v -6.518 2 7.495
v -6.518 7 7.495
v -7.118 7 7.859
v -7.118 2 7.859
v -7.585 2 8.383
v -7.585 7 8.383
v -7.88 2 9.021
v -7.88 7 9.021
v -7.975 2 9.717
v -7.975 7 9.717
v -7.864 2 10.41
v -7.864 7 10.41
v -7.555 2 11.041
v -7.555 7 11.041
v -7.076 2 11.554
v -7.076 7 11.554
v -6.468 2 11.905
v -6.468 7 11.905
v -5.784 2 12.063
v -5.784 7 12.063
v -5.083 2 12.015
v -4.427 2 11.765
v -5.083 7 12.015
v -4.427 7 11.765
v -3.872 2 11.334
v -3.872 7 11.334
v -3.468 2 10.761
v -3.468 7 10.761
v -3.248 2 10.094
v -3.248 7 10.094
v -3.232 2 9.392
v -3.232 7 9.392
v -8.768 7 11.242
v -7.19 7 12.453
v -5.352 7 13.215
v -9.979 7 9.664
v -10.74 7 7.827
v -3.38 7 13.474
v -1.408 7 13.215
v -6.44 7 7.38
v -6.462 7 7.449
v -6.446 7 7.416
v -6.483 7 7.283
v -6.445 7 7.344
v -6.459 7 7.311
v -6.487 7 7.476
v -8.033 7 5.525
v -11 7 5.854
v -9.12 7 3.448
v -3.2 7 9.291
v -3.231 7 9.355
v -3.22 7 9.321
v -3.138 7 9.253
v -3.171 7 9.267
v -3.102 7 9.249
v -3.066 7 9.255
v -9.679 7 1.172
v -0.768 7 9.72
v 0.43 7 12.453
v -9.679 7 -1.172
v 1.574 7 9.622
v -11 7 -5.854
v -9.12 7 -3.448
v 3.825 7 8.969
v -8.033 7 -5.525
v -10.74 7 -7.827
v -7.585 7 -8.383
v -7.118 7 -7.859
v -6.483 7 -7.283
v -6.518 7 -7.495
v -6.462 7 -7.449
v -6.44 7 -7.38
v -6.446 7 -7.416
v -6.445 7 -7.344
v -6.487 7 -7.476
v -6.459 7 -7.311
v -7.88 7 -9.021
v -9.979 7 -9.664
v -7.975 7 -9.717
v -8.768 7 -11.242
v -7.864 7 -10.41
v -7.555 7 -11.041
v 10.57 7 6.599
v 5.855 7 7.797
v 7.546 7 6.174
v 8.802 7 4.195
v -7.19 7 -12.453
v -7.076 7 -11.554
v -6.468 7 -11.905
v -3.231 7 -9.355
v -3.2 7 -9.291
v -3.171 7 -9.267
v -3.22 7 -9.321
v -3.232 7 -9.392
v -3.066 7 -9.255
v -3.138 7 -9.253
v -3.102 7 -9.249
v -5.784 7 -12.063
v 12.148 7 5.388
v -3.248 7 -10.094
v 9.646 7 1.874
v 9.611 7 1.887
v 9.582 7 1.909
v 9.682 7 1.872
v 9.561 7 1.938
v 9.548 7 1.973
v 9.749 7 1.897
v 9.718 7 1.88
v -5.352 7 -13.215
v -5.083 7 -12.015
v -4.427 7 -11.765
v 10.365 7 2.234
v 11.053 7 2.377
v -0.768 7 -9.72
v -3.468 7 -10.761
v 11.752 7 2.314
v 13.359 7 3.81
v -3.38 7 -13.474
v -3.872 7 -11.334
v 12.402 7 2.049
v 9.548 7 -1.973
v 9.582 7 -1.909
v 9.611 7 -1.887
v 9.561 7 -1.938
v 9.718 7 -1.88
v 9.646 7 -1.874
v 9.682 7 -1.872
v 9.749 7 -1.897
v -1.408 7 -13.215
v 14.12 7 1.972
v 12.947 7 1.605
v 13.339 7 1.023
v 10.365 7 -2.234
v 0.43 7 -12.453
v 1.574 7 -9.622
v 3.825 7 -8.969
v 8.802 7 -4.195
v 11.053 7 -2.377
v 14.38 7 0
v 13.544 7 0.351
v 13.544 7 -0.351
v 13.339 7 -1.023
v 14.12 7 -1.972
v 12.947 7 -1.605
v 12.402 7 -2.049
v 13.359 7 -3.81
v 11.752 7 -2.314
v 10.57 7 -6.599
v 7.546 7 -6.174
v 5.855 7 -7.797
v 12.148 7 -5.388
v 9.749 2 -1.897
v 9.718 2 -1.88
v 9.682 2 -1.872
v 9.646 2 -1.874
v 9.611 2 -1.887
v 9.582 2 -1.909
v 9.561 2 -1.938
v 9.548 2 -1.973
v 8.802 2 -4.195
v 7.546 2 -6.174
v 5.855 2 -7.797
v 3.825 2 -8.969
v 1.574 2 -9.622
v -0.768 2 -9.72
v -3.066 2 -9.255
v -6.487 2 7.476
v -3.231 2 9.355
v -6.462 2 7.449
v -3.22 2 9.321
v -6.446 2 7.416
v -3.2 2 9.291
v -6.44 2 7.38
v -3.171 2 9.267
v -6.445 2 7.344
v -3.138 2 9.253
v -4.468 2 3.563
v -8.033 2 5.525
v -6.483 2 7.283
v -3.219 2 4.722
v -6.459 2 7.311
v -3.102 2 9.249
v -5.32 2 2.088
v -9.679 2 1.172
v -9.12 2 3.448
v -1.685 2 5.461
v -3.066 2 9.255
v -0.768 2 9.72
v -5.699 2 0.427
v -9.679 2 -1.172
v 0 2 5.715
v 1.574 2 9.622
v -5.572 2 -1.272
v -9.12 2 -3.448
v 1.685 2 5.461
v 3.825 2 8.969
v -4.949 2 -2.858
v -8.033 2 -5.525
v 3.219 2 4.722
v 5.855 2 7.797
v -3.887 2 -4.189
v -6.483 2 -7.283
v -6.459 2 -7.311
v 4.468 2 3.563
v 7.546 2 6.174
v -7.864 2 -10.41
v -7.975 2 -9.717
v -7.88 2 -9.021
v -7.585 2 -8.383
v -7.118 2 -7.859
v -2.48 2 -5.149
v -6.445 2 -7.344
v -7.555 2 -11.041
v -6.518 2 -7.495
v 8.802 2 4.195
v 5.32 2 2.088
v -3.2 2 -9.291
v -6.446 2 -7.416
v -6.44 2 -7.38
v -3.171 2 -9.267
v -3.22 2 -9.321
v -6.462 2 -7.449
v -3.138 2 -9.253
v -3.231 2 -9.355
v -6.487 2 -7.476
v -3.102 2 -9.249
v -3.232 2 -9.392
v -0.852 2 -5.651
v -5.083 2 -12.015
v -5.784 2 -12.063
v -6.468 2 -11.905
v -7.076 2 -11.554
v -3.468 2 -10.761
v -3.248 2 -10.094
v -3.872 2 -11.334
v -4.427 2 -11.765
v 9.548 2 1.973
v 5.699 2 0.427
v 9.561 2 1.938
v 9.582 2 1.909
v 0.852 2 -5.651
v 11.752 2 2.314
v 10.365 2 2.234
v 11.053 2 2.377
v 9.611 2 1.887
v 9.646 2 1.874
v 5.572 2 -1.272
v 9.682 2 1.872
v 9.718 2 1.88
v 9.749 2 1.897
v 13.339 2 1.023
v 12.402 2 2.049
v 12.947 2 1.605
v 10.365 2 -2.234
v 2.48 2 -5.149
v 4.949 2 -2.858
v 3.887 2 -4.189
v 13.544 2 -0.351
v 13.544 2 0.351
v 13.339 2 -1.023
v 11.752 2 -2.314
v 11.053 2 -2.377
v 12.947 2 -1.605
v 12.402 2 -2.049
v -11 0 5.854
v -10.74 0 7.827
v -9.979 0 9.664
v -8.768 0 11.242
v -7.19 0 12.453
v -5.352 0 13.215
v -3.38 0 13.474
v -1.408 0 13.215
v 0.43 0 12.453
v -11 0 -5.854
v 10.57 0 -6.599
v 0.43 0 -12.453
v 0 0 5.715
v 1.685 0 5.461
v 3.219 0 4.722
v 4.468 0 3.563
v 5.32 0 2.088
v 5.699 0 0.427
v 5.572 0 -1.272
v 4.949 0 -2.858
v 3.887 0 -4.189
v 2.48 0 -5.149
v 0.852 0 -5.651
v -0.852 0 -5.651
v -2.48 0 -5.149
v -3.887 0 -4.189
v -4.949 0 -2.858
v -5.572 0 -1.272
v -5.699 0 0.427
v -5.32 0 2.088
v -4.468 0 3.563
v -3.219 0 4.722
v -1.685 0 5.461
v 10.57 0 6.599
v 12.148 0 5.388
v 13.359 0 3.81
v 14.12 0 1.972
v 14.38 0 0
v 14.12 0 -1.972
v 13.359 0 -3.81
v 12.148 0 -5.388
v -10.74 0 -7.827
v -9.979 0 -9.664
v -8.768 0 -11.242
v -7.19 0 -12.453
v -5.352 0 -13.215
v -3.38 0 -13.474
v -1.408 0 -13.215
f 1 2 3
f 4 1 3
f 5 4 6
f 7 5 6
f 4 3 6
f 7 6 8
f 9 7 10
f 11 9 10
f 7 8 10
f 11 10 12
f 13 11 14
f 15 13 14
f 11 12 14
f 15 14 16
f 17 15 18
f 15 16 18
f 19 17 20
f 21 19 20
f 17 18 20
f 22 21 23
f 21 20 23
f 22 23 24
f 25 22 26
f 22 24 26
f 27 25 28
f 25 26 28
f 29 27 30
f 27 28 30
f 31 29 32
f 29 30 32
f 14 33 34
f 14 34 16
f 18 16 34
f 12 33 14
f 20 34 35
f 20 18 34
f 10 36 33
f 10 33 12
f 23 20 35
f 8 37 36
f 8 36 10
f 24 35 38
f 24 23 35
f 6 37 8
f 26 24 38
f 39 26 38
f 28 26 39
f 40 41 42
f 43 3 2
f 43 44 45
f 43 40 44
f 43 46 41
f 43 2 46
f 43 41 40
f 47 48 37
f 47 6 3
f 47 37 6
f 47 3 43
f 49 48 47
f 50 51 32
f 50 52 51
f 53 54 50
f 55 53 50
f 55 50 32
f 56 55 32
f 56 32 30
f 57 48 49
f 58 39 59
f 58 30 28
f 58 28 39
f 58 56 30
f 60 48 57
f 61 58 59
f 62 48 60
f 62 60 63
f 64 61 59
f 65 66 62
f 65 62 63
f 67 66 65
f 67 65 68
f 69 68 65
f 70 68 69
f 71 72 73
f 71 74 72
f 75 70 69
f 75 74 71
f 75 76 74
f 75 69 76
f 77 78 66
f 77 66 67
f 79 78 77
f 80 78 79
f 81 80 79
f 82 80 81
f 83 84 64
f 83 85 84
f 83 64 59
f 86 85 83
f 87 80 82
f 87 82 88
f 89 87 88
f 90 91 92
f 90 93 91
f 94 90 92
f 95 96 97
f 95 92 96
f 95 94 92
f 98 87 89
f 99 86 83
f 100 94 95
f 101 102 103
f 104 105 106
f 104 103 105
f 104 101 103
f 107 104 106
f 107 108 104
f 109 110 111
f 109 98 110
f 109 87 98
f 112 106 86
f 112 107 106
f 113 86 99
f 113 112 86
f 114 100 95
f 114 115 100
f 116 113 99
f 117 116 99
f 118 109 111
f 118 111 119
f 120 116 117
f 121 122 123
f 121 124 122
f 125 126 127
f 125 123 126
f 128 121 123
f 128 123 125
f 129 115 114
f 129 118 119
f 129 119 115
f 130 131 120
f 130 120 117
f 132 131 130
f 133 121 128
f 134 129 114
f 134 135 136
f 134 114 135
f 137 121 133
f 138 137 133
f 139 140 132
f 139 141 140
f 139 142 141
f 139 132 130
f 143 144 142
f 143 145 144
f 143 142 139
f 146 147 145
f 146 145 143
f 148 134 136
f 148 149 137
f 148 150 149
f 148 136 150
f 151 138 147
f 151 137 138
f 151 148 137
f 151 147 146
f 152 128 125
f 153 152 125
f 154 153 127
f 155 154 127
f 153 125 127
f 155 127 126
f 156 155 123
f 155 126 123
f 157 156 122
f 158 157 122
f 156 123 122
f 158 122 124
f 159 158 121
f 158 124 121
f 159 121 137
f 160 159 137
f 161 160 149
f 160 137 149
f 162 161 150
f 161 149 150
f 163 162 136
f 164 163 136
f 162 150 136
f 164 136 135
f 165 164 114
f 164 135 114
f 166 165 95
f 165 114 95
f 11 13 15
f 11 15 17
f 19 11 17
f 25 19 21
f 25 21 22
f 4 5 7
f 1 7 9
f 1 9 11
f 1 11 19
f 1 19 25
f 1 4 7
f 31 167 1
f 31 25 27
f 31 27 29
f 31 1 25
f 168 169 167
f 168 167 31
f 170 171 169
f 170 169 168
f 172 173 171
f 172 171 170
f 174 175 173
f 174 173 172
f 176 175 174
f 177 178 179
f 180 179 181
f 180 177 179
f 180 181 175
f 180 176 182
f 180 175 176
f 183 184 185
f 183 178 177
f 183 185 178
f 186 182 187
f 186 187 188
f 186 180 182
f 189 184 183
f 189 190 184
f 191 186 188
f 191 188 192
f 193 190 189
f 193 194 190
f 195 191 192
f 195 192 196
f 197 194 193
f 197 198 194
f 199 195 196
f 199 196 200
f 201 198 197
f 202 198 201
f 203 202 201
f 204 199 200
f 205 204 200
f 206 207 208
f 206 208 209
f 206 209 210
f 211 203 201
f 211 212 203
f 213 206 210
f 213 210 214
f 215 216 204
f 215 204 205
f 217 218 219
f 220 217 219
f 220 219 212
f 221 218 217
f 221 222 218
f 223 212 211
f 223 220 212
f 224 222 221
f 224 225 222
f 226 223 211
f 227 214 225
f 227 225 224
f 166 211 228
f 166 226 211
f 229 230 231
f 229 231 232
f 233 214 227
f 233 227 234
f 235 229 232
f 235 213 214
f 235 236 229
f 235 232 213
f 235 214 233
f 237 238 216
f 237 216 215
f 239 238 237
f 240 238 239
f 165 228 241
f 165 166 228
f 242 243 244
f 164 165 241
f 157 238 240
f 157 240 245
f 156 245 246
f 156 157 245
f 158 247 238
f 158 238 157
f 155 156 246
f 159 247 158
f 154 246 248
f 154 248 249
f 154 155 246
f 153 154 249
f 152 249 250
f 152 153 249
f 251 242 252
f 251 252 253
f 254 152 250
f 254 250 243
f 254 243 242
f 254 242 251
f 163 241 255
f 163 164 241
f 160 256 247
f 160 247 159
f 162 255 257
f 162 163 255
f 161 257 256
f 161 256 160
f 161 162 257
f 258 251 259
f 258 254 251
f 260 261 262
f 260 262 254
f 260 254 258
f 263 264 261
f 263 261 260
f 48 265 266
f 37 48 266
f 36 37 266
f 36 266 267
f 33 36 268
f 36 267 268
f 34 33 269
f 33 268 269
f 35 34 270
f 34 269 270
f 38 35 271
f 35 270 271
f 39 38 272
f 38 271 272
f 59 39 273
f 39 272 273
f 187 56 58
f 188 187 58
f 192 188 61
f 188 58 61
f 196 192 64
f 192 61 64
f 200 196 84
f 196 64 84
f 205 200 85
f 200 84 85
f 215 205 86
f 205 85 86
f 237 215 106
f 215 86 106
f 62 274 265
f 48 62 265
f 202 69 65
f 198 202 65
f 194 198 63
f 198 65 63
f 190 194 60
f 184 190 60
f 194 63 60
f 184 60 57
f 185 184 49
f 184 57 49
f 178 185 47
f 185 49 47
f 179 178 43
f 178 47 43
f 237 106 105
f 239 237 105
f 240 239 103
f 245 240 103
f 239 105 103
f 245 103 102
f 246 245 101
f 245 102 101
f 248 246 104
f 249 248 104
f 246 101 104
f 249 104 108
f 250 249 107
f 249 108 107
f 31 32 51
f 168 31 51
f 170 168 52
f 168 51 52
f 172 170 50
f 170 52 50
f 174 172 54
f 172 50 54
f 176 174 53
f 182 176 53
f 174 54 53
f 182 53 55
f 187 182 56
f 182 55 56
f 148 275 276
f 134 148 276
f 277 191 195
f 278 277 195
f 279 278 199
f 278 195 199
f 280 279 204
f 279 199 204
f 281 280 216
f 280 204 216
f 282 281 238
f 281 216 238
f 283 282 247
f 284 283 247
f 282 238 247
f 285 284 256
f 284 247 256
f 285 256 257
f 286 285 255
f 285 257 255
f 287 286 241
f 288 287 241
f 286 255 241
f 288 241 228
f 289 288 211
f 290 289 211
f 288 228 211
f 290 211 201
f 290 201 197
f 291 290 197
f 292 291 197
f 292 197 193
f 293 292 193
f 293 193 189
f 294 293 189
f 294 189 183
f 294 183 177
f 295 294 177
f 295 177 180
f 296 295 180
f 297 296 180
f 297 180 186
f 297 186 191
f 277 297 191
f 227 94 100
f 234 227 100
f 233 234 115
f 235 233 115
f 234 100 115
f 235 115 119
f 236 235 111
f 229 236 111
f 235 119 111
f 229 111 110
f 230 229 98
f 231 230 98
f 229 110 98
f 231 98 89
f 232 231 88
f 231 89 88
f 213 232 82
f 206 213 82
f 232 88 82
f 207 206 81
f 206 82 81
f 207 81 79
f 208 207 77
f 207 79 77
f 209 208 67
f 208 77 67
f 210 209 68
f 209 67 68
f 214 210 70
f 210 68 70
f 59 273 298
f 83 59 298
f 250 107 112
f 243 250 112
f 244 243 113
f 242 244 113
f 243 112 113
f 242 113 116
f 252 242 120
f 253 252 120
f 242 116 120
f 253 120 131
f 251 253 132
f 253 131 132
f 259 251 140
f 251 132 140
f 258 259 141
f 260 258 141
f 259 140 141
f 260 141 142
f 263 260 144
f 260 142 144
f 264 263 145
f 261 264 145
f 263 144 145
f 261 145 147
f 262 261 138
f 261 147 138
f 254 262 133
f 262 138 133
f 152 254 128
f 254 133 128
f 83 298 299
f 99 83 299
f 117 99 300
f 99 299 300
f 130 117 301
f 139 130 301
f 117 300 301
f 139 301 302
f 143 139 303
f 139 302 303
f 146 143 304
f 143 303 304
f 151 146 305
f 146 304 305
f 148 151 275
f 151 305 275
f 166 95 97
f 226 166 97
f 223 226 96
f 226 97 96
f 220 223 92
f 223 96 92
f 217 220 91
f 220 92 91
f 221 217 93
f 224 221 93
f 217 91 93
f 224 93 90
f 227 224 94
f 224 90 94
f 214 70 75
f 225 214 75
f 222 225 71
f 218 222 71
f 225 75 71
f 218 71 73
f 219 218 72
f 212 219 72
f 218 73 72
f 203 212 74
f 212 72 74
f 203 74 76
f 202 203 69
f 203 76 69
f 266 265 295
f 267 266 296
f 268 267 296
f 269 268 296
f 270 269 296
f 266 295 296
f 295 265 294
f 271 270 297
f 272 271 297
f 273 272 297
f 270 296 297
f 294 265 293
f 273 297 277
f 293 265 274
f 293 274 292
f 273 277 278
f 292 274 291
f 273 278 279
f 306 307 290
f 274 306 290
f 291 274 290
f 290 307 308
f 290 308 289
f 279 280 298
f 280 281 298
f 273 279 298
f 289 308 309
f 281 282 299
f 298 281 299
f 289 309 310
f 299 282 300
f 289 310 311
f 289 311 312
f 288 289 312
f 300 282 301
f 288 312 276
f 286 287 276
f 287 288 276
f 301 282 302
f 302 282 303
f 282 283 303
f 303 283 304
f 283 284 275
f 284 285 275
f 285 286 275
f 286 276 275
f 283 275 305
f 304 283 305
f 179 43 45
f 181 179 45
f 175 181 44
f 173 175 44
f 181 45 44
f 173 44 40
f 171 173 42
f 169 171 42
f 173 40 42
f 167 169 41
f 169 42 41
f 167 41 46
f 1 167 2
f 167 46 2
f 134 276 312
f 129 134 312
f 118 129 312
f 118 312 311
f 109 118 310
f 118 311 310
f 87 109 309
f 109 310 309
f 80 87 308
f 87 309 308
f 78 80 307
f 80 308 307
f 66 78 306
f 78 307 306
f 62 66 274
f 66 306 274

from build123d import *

# Parameters (mm, degrees)
BOSS_EXTRUDE15_DEPTH = 7
CUT_EXTRUDE1_DEPTH   = 5
SKETCH9_R            = 5.715
CUT_EXTRUDE2_DEPTH   = 5


with BuildPart() as part:
    # Sketch7 → Boss-Extrude15 (new body)
    with BuildSketch(Plane(origin=(0, 0, 0), x_dir=(1, 0, 0), z_dir=(0, 1, 0))):
        with BuildLine():
            Line((10.57, 6.599113577), (0.43, 12.453445306))
            ThreePointArc((0.43, 12.453445306), (-7.19, 12.453445306), (-11, 5.85433173))
            Line((-11, 5.85433173), (-11, -5.85433173))
            ThreePointArc((-11, -5.85433173), (-7.19, -12.453445306), (0.43, -12.453445306))
            Line((0.43, -12.453445306), (10.57, -6.599113577))
            ThreePointArc((10.57, -6.599113577), (14.38, 0), (10.57, 6.599113577))
        make_face()
    extrude(amount=BOSS_EXTRUDE15_DEPTH)

    # Sketch8 → Cut-Extrude1 (cut)
    with BuildSketch(Plane(origin=(0, 7, 0), x_dir=(1, 0, 0), z_dir=(0, 1, 0))):
        with BuildLine():
            ThreePointArc((-6.482578701, -7.282765504), (-6.441733645, -7.398430092), (-6.51776578, -7.494688754))
            ThreePointArc((-6.51776578, -7.494688754), (-7.970853819, -9.540441946), (-6.784903319, -11.751797273))
            ThreePointArc((-6.784903319, -11.751797273), (-4.276838179, -11.67318287), (-3.231707964, -9.391895118))
            ThreePointArc((-3.231707964, -9.391895118), (-3.186361585, -9.277920027), (-3.065770585, -9.255460589))
            ThreePointArc((-3.065770585, -9.255460589), (4.875, -8.443747687), (9.548349287, -1.972695086))
            ThreePointArc((9.548349287, -1.972695086), (9.62809523, -1.879489935), (9.749473744, -1.897206364))
            ThreePointArc((9.749473744, -1.897206364), (12.247691998, -2.132740924), (13.569806638, 0))
            ThreePointArc((13.569806638, 0), (12.247691998, 2.132740924), (9.749473744, 1.897206364))
            ThreePointArc((9.749473744, 1.897206364), (9.62809523, 1.879489935), (9.548349287, 1.972695086))
            ThreePointArc((9.548349287, 1.972695086), (4.875, 8.443747687), (-3.065770585, 9.255460589))
            ThreePointArc((-3.065770585, 9.255460589), (-3.186361585, 9.277920027), (-3.231707964, 9.391895118))
            ThreePointArc((-3.231707964, 9.391895118), (-4.276838179, 11.67318287), (-6.784903319, 11.751797273))
            ThreePointArc((-6.784903319, 11.751797273), (-7.970853819, 9.540441946), (-6.51776578, 7.494688754))
            ThreePointArc((-6.51776578, 7.494688754), (-6.441733645, 7.398430092), (-6.482578701, 7.282765504))
            ThreePointArc((-6.482578701, 7.282765504), (-9.75, 0), (-6.482578701, -7.282765504))
        make_face()
    extrude(amount=-CUT_EXTRUDE1_DEPTH, mode=Mode.SUBTRACT)

    # Sketch9 → Cut-Extrude2 (cut)
    with BuildSketch(Plane(origin=(0, 2, 0), x_dir=(1, 0, 0), z_dir=(0, 1, 0))):
        Circle(SKETCH9_R)
    extrude(amount=-CUT_EXTRUDE2_DEPTH, mode=Mode.SUBTRACT)


solid = part.part
